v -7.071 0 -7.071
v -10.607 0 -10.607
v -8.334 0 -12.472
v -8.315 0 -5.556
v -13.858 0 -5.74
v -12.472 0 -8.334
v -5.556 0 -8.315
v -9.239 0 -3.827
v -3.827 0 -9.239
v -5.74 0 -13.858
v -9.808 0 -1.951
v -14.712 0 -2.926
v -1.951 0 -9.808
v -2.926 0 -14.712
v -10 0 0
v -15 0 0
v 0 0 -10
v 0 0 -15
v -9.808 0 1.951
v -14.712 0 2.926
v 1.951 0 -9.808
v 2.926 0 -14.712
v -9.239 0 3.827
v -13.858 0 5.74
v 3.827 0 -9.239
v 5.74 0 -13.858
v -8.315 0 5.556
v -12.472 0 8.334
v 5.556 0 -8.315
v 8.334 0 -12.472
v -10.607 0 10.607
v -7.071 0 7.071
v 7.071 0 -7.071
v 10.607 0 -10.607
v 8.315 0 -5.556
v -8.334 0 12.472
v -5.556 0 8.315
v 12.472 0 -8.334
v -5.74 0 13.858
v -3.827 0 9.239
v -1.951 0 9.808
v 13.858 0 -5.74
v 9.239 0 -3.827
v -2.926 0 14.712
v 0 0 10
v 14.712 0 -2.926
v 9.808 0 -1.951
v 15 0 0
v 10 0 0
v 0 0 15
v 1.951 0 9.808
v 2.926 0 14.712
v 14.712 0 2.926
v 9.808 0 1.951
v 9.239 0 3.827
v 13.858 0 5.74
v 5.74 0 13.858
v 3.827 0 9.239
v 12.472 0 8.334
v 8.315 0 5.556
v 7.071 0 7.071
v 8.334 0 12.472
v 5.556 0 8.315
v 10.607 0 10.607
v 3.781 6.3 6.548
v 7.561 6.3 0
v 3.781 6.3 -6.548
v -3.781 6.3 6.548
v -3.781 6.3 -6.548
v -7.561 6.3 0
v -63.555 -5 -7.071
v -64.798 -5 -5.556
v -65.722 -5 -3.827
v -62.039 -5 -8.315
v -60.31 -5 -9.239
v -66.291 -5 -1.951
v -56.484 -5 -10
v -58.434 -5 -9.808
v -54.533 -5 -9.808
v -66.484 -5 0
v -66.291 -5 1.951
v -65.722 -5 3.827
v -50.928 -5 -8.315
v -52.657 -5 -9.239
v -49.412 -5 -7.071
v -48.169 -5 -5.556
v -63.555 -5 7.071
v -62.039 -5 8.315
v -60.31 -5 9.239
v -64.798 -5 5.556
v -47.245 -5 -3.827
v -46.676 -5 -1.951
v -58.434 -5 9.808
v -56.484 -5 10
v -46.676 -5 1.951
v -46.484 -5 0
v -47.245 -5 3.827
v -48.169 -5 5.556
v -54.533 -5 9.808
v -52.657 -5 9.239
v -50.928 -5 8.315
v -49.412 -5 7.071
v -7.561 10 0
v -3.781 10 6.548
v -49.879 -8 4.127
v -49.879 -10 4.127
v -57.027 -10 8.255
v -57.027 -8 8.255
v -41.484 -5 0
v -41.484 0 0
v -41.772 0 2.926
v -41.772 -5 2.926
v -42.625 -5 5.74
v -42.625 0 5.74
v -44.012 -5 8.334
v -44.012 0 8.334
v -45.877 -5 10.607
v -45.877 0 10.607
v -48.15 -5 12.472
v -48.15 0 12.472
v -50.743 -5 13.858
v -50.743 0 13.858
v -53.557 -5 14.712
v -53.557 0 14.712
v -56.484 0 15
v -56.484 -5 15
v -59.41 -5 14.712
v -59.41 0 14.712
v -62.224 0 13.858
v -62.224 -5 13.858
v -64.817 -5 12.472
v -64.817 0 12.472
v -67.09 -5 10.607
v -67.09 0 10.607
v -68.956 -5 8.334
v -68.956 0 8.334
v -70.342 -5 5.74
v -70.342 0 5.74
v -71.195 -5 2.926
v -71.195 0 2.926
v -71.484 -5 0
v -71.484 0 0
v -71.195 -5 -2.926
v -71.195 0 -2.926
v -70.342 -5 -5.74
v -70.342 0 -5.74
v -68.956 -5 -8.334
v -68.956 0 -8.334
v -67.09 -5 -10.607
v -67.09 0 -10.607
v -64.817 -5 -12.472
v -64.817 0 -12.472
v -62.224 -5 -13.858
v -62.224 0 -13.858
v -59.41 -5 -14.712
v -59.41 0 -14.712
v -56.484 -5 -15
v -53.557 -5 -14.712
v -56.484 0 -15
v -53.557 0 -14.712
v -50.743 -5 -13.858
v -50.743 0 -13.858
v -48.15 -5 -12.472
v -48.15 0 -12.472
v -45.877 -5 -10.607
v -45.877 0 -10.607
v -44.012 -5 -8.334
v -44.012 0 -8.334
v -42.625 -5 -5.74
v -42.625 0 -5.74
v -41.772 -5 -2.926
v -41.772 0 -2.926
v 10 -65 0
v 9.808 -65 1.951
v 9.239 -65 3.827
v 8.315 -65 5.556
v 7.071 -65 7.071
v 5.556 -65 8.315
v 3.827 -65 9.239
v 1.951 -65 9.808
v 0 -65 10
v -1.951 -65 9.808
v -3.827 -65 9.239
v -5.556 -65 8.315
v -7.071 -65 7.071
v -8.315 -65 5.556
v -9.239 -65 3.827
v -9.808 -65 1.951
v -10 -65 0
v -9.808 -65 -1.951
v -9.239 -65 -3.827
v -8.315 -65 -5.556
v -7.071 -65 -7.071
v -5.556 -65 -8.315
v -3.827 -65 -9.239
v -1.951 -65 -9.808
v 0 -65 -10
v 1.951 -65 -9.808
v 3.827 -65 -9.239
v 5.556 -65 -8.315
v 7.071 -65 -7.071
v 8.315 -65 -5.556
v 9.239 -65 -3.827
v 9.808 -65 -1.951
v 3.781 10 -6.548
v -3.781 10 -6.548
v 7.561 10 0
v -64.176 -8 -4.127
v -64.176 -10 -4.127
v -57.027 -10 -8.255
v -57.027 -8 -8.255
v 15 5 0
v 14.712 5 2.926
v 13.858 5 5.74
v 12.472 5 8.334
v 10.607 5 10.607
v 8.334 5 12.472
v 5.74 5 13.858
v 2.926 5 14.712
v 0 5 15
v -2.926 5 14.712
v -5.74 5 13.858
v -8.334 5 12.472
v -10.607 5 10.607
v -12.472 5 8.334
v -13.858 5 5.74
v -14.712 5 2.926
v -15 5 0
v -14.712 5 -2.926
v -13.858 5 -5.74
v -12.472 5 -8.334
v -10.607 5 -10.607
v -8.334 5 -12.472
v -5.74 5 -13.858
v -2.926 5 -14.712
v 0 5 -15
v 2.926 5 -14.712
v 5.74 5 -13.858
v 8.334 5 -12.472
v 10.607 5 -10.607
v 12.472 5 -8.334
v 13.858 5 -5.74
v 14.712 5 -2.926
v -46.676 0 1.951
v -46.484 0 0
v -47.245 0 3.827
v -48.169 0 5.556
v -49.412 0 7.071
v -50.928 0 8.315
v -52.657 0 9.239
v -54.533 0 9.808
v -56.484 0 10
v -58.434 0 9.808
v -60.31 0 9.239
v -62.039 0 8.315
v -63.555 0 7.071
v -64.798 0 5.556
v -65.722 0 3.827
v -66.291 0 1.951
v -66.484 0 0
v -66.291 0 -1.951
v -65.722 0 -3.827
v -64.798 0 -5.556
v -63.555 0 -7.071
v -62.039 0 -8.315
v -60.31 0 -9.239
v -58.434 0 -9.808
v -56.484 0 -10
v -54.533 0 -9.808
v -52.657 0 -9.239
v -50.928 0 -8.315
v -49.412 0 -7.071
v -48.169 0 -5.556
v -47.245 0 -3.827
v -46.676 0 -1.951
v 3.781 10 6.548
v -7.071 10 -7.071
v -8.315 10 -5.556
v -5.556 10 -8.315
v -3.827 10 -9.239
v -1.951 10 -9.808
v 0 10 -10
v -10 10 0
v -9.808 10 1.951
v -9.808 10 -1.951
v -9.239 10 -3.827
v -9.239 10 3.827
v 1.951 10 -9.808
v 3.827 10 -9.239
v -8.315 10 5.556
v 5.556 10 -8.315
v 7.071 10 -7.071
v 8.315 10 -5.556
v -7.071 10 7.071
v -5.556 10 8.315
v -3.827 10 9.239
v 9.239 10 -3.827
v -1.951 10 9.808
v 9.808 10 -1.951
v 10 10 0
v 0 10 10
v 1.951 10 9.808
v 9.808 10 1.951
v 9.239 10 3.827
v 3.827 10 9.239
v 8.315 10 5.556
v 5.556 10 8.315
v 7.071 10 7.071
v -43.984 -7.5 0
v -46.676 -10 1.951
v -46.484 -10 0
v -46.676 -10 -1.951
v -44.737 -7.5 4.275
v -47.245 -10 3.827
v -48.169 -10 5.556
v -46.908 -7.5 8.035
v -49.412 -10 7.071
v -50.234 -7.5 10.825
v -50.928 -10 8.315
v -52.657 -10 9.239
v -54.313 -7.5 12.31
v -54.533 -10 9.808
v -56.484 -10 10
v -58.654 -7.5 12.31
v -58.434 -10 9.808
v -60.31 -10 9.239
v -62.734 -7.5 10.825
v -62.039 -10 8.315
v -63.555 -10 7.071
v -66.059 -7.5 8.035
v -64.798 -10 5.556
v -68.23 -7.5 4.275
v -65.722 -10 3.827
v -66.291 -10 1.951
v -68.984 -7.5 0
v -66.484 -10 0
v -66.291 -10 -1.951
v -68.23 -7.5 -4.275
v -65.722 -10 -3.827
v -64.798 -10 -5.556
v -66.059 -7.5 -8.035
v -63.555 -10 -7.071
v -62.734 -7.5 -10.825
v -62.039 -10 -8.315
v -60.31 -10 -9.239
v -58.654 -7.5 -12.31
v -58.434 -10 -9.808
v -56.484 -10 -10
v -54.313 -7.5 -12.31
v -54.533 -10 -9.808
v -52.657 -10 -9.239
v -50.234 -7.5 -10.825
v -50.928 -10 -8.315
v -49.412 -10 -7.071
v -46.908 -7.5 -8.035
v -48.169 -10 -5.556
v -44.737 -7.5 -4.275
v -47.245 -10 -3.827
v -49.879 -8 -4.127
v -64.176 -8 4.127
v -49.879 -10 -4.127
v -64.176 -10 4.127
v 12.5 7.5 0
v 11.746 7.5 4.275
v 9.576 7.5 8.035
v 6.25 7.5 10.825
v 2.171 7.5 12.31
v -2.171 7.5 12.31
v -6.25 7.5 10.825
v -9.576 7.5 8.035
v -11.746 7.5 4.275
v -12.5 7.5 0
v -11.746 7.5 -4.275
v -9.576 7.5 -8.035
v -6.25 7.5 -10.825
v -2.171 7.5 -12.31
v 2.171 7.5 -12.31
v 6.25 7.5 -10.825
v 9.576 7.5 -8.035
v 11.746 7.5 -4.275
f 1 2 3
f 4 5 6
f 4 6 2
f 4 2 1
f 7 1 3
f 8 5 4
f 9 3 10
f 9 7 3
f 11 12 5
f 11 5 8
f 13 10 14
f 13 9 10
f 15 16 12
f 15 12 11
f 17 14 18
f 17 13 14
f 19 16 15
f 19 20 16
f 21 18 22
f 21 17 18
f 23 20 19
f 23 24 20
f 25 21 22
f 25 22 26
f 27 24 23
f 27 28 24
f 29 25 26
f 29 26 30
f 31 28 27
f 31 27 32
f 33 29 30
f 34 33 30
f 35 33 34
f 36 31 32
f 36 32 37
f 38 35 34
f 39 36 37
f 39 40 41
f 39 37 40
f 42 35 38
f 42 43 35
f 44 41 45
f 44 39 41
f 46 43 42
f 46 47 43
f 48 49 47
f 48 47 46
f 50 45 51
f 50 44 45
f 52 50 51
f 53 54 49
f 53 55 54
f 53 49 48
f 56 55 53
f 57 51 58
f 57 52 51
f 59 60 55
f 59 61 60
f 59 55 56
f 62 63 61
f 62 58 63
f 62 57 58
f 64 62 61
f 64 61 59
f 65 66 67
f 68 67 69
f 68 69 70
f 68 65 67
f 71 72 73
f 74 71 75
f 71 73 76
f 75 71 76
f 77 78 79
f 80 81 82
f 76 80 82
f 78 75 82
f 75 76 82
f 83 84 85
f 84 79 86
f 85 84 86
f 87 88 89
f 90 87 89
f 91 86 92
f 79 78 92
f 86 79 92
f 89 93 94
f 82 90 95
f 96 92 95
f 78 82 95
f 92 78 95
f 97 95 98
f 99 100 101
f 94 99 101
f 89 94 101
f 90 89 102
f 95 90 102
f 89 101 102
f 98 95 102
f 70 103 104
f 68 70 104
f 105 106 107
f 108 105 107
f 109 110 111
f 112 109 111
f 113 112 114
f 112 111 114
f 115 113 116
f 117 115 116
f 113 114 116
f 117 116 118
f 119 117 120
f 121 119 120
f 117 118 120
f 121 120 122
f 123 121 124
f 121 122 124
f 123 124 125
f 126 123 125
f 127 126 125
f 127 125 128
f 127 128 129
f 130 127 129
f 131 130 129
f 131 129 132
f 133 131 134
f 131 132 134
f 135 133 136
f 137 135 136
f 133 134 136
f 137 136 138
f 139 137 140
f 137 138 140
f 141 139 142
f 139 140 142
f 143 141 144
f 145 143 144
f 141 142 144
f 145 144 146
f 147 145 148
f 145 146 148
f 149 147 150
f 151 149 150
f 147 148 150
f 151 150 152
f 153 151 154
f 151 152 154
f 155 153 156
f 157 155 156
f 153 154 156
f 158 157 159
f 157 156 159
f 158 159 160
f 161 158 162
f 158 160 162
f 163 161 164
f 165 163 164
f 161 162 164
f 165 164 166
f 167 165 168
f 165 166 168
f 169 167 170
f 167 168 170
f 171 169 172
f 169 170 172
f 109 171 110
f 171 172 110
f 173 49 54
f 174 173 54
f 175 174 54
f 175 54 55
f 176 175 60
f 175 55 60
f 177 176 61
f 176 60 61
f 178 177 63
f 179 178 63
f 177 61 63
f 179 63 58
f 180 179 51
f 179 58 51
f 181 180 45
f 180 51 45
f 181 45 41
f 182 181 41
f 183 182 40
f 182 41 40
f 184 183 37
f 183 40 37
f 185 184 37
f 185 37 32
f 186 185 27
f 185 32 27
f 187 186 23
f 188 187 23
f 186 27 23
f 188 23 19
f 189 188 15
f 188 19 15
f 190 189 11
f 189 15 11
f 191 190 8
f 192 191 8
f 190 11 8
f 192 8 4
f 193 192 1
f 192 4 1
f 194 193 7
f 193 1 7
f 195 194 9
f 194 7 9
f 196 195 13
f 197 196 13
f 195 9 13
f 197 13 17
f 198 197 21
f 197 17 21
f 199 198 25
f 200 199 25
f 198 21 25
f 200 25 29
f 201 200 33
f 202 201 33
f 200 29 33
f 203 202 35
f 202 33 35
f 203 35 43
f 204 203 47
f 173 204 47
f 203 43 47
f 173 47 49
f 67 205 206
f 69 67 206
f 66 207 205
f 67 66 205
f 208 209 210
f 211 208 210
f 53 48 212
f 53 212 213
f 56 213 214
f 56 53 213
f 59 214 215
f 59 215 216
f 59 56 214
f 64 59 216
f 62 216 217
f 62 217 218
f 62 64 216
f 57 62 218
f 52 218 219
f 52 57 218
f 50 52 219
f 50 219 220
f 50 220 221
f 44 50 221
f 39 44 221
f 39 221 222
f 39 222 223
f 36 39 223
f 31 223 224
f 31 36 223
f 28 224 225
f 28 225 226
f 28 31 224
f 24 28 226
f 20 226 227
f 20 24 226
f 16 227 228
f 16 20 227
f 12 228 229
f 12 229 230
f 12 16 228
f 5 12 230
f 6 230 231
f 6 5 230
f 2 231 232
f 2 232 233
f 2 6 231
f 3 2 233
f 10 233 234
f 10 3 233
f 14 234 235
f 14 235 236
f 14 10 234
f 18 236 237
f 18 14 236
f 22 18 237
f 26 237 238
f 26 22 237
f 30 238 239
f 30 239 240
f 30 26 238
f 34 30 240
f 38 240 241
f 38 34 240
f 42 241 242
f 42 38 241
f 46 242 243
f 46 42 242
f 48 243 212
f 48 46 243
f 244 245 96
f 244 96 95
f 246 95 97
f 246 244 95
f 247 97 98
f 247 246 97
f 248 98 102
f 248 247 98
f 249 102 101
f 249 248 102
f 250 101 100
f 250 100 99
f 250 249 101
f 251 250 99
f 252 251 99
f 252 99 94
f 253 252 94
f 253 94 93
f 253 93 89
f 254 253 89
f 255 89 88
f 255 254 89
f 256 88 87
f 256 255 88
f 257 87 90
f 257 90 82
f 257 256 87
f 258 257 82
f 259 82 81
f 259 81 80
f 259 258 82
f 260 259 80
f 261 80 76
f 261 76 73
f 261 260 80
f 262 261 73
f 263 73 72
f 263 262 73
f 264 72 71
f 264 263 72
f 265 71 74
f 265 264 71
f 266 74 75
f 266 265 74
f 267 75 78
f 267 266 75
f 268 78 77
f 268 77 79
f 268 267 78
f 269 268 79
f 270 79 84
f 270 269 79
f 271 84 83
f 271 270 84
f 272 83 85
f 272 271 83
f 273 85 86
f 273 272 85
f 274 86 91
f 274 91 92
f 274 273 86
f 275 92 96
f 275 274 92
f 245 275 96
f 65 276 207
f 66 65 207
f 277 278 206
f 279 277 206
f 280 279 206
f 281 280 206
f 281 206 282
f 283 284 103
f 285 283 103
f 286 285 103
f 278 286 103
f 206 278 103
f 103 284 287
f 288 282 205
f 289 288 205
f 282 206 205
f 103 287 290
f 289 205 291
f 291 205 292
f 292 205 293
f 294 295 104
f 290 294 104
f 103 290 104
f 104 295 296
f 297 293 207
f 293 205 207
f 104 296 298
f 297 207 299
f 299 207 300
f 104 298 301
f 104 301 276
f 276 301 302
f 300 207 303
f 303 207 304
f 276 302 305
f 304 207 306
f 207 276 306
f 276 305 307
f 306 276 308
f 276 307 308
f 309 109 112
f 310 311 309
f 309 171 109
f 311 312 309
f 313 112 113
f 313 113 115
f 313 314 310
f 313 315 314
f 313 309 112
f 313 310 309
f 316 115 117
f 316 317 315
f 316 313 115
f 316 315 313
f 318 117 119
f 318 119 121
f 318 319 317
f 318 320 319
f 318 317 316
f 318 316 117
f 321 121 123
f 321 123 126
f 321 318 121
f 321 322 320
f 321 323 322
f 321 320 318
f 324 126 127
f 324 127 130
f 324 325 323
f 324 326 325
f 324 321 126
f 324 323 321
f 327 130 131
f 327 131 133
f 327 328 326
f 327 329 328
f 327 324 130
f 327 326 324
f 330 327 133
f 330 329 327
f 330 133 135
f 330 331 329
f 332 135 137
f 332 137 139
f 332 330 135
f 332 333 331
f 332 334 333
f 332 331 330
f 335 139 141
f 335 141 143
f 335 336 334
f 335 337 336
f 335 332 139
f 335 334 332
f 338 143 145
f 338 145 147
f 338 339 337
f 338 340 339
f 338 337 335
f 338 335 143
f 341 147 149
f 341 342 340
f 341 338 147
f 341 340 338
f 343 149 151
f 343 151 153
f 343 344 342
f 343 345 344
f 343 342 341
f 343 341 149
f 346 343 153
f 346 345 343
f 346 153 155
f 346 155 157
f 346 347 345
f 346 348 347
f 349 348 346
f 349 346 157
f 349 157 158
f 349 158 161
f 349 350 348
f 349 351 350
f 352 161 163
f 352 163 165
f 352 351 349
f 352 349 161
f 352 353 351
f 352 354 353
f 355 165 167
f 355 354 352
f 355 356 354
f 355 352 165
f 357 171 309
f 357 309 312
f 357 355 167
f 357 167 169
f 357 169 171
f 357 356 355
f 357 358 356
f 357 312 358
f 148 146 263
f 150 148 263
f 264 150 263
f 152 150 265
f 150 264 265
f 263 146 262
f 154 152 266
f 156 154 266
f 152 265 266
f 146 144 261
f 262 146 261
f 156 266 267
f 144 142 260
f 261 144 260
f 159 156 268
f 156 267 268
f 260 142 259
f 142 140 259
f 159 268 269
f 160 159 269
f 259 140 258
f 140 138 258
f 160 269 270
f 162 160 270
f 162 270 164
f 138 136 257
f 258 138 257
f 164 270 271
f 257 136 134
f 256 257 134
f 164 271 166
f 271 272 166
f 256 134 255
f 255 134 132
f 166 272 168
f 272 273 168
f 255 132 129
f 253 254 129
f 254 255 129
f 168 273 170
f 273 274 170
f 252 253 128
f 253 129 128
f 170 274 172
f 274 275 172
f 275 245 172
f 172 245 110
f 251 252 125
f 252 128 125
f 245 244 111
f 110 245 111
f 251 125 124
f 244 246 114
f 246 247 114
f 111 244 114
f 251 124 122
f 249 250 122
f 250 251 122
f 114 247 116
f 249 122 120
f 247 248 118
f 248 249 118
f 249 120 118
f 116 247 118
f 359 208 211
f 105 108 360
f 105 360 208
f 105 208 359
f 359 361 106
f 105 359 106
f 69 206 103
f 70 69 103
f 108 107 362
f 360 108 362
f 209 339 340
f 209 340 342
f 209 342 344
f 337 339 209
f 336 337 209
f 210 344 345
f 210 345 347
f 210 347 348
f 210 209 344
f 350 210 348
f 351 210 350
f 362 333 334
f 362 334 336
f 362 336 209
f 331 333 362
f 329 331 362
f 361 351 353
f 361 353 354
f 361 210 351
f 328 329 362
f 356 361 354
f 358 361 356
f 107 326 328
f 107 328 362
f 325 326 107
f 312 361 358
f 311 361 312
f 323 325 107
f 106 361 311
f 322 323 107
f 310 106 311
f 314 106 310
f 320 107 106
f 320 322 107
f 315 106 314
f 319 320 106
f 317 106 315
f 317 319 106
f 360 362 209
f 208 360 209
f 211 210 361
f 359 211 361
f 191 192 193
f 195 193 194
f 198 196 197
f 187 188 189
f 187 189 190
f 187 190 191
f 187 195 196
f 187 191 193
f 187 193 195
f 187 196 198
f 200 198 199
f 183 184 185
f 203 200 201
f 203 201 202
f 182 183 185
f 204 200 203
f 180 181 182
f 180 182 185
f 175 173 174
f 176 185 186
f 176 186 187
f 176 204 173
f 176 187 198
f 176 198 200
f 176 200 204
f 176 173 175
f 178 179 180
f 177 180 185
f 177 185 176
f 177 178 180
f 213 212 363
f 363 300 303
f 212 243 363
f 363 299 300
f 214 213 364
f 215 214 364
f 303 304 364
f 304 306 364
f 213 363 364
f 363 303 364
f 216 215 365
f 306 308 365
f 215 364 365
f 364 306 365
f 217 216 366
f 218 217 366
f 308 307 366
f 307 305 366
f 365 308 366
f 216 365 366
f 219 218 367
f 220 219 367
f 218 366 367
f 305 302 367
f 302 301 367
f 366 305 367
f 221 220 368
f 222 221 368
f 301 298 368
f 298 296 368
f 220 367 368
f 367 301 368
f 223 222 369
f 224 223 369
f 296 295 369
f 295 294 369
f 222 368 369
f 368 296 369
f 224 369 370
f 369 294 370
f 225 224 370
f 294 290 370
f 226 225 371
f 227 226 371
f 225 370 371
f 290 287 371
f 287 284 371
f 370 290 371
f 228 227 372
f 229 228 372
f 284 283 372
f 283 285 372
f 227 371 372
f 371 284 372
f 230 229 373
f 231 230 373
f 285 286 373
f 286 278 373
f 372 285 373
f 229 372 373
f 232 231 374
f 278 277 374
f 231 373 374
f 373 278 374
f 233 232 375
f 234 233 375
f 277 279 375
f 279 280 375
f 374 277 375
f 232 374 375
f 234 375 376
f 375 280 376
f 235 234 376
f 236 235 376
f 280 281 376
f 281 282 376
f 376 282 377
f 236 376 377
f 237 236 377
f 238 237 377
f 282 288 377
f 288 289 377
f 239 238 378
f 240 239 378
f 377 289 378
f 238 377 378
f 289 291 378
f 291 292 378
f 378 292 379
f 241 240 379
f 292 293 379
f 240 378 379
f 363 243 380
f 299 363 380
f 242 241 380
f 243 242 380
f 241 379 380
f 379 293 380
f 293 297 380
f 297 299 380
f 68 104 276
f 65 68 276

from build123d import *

# Parameters (mm, degrees)
F0_R      = 10
F1_DEPTH  = 65
F0_R_2    = 15
F2_DEPTH  = 10
F3_DEPTH  = 10
F4_DEPTH  = 5
F5_SIZE   = 5
F5_2_SIZE = 5
F7_DEPTH  = 3.7
F10_DEPTH = 2


with BuildPart() as f1:
    # F0 (on Front) → F1 (new body)
    with BuildSketch(Plane.XZ):
        Circle(F0_R)
    extrude(amount=F1_DEPTH)

    # F0 (on Front) → F2 (join)
    with BuildSketch(Plane.XZ):
        Circle(F0_R_2)
        Circle(F0_R, mode=Mode.SUBTRACT)
        Circle(F0_R)
    extrude(amount=-F2_DEPTH)

    # F5
    f5_edges = [f1.edges().sort_by_distance(p)[0] for p in [
        (-15, 10, 0),
    ]]
    chamfer(f5_edges, length=F5_SIZE)

    # F6 (on face) → F7 (cut)
    with BuildSketch(Plane(origin=(0, 10, 0), x_dir=(-1, 0, 0), z_dir=(0, 1, 0))):
        Polygon((-3.7807237503, -6.5484056249), (3.7807237503, -6.5484056249), (7.5614475006, 0), (3.7807237503, 6.5484056249), (-3.7807237503, 6.5484056249), (-7.5614475006, 0), align=None)
    extrude(amount=-F7_DEPTH, mode=Mode.SUBTRACT)


with BuildPart() as f3:
    # F0 (on Front) → F3 (new body)
    with BuildSketch(Plane.XZ):
        with Locations((-56.483566761, 0)):
            Circle(F0_R_2)
        with Locations((-56.483566761, 0)):
            Circle(F0_R, mode=Mode.SUBTRACT)
        with Locations((-56.483566761, 0)):
            Circle(F0_R)
    extrude(amount=F3_DEPTH)

    # F0 (on Front) → F4 (cut)
    with BuildSketch(Plane.XZ):
        with Locations((-56.483566761, 0)):
            Circle(F0_R)
    extrude(amount=F4_DEPTH, mode=Mode.SUBTRACT)

    # F5#2
    f5_2_edges = [f3.edges().sort_by_distance(p)[0] for p in [
        (-71.483567, -10, 0),
    ]]
    chamfer(f5_2_edges, length=F5_2_SIZE)

    # F9 (on offset) → F10 (cut)
    with BuildSketch(Plane.XZ.offset(10)):
        Polygon((-49.8785935342, -4.1273156034), (-49.8785935342, 4.1273156034), (-57.0273138583, 8.2546312069), (-64.1760341823, 4.1273156034), (-64.1760341823, -4.1273156034), (-57.0273138583, -8.2546312069), align=None)
    extrude(amount=-F10_DEPTH, mode=Mode.SUBTRACT)


solid = Compound([f1.part, f3.part])
